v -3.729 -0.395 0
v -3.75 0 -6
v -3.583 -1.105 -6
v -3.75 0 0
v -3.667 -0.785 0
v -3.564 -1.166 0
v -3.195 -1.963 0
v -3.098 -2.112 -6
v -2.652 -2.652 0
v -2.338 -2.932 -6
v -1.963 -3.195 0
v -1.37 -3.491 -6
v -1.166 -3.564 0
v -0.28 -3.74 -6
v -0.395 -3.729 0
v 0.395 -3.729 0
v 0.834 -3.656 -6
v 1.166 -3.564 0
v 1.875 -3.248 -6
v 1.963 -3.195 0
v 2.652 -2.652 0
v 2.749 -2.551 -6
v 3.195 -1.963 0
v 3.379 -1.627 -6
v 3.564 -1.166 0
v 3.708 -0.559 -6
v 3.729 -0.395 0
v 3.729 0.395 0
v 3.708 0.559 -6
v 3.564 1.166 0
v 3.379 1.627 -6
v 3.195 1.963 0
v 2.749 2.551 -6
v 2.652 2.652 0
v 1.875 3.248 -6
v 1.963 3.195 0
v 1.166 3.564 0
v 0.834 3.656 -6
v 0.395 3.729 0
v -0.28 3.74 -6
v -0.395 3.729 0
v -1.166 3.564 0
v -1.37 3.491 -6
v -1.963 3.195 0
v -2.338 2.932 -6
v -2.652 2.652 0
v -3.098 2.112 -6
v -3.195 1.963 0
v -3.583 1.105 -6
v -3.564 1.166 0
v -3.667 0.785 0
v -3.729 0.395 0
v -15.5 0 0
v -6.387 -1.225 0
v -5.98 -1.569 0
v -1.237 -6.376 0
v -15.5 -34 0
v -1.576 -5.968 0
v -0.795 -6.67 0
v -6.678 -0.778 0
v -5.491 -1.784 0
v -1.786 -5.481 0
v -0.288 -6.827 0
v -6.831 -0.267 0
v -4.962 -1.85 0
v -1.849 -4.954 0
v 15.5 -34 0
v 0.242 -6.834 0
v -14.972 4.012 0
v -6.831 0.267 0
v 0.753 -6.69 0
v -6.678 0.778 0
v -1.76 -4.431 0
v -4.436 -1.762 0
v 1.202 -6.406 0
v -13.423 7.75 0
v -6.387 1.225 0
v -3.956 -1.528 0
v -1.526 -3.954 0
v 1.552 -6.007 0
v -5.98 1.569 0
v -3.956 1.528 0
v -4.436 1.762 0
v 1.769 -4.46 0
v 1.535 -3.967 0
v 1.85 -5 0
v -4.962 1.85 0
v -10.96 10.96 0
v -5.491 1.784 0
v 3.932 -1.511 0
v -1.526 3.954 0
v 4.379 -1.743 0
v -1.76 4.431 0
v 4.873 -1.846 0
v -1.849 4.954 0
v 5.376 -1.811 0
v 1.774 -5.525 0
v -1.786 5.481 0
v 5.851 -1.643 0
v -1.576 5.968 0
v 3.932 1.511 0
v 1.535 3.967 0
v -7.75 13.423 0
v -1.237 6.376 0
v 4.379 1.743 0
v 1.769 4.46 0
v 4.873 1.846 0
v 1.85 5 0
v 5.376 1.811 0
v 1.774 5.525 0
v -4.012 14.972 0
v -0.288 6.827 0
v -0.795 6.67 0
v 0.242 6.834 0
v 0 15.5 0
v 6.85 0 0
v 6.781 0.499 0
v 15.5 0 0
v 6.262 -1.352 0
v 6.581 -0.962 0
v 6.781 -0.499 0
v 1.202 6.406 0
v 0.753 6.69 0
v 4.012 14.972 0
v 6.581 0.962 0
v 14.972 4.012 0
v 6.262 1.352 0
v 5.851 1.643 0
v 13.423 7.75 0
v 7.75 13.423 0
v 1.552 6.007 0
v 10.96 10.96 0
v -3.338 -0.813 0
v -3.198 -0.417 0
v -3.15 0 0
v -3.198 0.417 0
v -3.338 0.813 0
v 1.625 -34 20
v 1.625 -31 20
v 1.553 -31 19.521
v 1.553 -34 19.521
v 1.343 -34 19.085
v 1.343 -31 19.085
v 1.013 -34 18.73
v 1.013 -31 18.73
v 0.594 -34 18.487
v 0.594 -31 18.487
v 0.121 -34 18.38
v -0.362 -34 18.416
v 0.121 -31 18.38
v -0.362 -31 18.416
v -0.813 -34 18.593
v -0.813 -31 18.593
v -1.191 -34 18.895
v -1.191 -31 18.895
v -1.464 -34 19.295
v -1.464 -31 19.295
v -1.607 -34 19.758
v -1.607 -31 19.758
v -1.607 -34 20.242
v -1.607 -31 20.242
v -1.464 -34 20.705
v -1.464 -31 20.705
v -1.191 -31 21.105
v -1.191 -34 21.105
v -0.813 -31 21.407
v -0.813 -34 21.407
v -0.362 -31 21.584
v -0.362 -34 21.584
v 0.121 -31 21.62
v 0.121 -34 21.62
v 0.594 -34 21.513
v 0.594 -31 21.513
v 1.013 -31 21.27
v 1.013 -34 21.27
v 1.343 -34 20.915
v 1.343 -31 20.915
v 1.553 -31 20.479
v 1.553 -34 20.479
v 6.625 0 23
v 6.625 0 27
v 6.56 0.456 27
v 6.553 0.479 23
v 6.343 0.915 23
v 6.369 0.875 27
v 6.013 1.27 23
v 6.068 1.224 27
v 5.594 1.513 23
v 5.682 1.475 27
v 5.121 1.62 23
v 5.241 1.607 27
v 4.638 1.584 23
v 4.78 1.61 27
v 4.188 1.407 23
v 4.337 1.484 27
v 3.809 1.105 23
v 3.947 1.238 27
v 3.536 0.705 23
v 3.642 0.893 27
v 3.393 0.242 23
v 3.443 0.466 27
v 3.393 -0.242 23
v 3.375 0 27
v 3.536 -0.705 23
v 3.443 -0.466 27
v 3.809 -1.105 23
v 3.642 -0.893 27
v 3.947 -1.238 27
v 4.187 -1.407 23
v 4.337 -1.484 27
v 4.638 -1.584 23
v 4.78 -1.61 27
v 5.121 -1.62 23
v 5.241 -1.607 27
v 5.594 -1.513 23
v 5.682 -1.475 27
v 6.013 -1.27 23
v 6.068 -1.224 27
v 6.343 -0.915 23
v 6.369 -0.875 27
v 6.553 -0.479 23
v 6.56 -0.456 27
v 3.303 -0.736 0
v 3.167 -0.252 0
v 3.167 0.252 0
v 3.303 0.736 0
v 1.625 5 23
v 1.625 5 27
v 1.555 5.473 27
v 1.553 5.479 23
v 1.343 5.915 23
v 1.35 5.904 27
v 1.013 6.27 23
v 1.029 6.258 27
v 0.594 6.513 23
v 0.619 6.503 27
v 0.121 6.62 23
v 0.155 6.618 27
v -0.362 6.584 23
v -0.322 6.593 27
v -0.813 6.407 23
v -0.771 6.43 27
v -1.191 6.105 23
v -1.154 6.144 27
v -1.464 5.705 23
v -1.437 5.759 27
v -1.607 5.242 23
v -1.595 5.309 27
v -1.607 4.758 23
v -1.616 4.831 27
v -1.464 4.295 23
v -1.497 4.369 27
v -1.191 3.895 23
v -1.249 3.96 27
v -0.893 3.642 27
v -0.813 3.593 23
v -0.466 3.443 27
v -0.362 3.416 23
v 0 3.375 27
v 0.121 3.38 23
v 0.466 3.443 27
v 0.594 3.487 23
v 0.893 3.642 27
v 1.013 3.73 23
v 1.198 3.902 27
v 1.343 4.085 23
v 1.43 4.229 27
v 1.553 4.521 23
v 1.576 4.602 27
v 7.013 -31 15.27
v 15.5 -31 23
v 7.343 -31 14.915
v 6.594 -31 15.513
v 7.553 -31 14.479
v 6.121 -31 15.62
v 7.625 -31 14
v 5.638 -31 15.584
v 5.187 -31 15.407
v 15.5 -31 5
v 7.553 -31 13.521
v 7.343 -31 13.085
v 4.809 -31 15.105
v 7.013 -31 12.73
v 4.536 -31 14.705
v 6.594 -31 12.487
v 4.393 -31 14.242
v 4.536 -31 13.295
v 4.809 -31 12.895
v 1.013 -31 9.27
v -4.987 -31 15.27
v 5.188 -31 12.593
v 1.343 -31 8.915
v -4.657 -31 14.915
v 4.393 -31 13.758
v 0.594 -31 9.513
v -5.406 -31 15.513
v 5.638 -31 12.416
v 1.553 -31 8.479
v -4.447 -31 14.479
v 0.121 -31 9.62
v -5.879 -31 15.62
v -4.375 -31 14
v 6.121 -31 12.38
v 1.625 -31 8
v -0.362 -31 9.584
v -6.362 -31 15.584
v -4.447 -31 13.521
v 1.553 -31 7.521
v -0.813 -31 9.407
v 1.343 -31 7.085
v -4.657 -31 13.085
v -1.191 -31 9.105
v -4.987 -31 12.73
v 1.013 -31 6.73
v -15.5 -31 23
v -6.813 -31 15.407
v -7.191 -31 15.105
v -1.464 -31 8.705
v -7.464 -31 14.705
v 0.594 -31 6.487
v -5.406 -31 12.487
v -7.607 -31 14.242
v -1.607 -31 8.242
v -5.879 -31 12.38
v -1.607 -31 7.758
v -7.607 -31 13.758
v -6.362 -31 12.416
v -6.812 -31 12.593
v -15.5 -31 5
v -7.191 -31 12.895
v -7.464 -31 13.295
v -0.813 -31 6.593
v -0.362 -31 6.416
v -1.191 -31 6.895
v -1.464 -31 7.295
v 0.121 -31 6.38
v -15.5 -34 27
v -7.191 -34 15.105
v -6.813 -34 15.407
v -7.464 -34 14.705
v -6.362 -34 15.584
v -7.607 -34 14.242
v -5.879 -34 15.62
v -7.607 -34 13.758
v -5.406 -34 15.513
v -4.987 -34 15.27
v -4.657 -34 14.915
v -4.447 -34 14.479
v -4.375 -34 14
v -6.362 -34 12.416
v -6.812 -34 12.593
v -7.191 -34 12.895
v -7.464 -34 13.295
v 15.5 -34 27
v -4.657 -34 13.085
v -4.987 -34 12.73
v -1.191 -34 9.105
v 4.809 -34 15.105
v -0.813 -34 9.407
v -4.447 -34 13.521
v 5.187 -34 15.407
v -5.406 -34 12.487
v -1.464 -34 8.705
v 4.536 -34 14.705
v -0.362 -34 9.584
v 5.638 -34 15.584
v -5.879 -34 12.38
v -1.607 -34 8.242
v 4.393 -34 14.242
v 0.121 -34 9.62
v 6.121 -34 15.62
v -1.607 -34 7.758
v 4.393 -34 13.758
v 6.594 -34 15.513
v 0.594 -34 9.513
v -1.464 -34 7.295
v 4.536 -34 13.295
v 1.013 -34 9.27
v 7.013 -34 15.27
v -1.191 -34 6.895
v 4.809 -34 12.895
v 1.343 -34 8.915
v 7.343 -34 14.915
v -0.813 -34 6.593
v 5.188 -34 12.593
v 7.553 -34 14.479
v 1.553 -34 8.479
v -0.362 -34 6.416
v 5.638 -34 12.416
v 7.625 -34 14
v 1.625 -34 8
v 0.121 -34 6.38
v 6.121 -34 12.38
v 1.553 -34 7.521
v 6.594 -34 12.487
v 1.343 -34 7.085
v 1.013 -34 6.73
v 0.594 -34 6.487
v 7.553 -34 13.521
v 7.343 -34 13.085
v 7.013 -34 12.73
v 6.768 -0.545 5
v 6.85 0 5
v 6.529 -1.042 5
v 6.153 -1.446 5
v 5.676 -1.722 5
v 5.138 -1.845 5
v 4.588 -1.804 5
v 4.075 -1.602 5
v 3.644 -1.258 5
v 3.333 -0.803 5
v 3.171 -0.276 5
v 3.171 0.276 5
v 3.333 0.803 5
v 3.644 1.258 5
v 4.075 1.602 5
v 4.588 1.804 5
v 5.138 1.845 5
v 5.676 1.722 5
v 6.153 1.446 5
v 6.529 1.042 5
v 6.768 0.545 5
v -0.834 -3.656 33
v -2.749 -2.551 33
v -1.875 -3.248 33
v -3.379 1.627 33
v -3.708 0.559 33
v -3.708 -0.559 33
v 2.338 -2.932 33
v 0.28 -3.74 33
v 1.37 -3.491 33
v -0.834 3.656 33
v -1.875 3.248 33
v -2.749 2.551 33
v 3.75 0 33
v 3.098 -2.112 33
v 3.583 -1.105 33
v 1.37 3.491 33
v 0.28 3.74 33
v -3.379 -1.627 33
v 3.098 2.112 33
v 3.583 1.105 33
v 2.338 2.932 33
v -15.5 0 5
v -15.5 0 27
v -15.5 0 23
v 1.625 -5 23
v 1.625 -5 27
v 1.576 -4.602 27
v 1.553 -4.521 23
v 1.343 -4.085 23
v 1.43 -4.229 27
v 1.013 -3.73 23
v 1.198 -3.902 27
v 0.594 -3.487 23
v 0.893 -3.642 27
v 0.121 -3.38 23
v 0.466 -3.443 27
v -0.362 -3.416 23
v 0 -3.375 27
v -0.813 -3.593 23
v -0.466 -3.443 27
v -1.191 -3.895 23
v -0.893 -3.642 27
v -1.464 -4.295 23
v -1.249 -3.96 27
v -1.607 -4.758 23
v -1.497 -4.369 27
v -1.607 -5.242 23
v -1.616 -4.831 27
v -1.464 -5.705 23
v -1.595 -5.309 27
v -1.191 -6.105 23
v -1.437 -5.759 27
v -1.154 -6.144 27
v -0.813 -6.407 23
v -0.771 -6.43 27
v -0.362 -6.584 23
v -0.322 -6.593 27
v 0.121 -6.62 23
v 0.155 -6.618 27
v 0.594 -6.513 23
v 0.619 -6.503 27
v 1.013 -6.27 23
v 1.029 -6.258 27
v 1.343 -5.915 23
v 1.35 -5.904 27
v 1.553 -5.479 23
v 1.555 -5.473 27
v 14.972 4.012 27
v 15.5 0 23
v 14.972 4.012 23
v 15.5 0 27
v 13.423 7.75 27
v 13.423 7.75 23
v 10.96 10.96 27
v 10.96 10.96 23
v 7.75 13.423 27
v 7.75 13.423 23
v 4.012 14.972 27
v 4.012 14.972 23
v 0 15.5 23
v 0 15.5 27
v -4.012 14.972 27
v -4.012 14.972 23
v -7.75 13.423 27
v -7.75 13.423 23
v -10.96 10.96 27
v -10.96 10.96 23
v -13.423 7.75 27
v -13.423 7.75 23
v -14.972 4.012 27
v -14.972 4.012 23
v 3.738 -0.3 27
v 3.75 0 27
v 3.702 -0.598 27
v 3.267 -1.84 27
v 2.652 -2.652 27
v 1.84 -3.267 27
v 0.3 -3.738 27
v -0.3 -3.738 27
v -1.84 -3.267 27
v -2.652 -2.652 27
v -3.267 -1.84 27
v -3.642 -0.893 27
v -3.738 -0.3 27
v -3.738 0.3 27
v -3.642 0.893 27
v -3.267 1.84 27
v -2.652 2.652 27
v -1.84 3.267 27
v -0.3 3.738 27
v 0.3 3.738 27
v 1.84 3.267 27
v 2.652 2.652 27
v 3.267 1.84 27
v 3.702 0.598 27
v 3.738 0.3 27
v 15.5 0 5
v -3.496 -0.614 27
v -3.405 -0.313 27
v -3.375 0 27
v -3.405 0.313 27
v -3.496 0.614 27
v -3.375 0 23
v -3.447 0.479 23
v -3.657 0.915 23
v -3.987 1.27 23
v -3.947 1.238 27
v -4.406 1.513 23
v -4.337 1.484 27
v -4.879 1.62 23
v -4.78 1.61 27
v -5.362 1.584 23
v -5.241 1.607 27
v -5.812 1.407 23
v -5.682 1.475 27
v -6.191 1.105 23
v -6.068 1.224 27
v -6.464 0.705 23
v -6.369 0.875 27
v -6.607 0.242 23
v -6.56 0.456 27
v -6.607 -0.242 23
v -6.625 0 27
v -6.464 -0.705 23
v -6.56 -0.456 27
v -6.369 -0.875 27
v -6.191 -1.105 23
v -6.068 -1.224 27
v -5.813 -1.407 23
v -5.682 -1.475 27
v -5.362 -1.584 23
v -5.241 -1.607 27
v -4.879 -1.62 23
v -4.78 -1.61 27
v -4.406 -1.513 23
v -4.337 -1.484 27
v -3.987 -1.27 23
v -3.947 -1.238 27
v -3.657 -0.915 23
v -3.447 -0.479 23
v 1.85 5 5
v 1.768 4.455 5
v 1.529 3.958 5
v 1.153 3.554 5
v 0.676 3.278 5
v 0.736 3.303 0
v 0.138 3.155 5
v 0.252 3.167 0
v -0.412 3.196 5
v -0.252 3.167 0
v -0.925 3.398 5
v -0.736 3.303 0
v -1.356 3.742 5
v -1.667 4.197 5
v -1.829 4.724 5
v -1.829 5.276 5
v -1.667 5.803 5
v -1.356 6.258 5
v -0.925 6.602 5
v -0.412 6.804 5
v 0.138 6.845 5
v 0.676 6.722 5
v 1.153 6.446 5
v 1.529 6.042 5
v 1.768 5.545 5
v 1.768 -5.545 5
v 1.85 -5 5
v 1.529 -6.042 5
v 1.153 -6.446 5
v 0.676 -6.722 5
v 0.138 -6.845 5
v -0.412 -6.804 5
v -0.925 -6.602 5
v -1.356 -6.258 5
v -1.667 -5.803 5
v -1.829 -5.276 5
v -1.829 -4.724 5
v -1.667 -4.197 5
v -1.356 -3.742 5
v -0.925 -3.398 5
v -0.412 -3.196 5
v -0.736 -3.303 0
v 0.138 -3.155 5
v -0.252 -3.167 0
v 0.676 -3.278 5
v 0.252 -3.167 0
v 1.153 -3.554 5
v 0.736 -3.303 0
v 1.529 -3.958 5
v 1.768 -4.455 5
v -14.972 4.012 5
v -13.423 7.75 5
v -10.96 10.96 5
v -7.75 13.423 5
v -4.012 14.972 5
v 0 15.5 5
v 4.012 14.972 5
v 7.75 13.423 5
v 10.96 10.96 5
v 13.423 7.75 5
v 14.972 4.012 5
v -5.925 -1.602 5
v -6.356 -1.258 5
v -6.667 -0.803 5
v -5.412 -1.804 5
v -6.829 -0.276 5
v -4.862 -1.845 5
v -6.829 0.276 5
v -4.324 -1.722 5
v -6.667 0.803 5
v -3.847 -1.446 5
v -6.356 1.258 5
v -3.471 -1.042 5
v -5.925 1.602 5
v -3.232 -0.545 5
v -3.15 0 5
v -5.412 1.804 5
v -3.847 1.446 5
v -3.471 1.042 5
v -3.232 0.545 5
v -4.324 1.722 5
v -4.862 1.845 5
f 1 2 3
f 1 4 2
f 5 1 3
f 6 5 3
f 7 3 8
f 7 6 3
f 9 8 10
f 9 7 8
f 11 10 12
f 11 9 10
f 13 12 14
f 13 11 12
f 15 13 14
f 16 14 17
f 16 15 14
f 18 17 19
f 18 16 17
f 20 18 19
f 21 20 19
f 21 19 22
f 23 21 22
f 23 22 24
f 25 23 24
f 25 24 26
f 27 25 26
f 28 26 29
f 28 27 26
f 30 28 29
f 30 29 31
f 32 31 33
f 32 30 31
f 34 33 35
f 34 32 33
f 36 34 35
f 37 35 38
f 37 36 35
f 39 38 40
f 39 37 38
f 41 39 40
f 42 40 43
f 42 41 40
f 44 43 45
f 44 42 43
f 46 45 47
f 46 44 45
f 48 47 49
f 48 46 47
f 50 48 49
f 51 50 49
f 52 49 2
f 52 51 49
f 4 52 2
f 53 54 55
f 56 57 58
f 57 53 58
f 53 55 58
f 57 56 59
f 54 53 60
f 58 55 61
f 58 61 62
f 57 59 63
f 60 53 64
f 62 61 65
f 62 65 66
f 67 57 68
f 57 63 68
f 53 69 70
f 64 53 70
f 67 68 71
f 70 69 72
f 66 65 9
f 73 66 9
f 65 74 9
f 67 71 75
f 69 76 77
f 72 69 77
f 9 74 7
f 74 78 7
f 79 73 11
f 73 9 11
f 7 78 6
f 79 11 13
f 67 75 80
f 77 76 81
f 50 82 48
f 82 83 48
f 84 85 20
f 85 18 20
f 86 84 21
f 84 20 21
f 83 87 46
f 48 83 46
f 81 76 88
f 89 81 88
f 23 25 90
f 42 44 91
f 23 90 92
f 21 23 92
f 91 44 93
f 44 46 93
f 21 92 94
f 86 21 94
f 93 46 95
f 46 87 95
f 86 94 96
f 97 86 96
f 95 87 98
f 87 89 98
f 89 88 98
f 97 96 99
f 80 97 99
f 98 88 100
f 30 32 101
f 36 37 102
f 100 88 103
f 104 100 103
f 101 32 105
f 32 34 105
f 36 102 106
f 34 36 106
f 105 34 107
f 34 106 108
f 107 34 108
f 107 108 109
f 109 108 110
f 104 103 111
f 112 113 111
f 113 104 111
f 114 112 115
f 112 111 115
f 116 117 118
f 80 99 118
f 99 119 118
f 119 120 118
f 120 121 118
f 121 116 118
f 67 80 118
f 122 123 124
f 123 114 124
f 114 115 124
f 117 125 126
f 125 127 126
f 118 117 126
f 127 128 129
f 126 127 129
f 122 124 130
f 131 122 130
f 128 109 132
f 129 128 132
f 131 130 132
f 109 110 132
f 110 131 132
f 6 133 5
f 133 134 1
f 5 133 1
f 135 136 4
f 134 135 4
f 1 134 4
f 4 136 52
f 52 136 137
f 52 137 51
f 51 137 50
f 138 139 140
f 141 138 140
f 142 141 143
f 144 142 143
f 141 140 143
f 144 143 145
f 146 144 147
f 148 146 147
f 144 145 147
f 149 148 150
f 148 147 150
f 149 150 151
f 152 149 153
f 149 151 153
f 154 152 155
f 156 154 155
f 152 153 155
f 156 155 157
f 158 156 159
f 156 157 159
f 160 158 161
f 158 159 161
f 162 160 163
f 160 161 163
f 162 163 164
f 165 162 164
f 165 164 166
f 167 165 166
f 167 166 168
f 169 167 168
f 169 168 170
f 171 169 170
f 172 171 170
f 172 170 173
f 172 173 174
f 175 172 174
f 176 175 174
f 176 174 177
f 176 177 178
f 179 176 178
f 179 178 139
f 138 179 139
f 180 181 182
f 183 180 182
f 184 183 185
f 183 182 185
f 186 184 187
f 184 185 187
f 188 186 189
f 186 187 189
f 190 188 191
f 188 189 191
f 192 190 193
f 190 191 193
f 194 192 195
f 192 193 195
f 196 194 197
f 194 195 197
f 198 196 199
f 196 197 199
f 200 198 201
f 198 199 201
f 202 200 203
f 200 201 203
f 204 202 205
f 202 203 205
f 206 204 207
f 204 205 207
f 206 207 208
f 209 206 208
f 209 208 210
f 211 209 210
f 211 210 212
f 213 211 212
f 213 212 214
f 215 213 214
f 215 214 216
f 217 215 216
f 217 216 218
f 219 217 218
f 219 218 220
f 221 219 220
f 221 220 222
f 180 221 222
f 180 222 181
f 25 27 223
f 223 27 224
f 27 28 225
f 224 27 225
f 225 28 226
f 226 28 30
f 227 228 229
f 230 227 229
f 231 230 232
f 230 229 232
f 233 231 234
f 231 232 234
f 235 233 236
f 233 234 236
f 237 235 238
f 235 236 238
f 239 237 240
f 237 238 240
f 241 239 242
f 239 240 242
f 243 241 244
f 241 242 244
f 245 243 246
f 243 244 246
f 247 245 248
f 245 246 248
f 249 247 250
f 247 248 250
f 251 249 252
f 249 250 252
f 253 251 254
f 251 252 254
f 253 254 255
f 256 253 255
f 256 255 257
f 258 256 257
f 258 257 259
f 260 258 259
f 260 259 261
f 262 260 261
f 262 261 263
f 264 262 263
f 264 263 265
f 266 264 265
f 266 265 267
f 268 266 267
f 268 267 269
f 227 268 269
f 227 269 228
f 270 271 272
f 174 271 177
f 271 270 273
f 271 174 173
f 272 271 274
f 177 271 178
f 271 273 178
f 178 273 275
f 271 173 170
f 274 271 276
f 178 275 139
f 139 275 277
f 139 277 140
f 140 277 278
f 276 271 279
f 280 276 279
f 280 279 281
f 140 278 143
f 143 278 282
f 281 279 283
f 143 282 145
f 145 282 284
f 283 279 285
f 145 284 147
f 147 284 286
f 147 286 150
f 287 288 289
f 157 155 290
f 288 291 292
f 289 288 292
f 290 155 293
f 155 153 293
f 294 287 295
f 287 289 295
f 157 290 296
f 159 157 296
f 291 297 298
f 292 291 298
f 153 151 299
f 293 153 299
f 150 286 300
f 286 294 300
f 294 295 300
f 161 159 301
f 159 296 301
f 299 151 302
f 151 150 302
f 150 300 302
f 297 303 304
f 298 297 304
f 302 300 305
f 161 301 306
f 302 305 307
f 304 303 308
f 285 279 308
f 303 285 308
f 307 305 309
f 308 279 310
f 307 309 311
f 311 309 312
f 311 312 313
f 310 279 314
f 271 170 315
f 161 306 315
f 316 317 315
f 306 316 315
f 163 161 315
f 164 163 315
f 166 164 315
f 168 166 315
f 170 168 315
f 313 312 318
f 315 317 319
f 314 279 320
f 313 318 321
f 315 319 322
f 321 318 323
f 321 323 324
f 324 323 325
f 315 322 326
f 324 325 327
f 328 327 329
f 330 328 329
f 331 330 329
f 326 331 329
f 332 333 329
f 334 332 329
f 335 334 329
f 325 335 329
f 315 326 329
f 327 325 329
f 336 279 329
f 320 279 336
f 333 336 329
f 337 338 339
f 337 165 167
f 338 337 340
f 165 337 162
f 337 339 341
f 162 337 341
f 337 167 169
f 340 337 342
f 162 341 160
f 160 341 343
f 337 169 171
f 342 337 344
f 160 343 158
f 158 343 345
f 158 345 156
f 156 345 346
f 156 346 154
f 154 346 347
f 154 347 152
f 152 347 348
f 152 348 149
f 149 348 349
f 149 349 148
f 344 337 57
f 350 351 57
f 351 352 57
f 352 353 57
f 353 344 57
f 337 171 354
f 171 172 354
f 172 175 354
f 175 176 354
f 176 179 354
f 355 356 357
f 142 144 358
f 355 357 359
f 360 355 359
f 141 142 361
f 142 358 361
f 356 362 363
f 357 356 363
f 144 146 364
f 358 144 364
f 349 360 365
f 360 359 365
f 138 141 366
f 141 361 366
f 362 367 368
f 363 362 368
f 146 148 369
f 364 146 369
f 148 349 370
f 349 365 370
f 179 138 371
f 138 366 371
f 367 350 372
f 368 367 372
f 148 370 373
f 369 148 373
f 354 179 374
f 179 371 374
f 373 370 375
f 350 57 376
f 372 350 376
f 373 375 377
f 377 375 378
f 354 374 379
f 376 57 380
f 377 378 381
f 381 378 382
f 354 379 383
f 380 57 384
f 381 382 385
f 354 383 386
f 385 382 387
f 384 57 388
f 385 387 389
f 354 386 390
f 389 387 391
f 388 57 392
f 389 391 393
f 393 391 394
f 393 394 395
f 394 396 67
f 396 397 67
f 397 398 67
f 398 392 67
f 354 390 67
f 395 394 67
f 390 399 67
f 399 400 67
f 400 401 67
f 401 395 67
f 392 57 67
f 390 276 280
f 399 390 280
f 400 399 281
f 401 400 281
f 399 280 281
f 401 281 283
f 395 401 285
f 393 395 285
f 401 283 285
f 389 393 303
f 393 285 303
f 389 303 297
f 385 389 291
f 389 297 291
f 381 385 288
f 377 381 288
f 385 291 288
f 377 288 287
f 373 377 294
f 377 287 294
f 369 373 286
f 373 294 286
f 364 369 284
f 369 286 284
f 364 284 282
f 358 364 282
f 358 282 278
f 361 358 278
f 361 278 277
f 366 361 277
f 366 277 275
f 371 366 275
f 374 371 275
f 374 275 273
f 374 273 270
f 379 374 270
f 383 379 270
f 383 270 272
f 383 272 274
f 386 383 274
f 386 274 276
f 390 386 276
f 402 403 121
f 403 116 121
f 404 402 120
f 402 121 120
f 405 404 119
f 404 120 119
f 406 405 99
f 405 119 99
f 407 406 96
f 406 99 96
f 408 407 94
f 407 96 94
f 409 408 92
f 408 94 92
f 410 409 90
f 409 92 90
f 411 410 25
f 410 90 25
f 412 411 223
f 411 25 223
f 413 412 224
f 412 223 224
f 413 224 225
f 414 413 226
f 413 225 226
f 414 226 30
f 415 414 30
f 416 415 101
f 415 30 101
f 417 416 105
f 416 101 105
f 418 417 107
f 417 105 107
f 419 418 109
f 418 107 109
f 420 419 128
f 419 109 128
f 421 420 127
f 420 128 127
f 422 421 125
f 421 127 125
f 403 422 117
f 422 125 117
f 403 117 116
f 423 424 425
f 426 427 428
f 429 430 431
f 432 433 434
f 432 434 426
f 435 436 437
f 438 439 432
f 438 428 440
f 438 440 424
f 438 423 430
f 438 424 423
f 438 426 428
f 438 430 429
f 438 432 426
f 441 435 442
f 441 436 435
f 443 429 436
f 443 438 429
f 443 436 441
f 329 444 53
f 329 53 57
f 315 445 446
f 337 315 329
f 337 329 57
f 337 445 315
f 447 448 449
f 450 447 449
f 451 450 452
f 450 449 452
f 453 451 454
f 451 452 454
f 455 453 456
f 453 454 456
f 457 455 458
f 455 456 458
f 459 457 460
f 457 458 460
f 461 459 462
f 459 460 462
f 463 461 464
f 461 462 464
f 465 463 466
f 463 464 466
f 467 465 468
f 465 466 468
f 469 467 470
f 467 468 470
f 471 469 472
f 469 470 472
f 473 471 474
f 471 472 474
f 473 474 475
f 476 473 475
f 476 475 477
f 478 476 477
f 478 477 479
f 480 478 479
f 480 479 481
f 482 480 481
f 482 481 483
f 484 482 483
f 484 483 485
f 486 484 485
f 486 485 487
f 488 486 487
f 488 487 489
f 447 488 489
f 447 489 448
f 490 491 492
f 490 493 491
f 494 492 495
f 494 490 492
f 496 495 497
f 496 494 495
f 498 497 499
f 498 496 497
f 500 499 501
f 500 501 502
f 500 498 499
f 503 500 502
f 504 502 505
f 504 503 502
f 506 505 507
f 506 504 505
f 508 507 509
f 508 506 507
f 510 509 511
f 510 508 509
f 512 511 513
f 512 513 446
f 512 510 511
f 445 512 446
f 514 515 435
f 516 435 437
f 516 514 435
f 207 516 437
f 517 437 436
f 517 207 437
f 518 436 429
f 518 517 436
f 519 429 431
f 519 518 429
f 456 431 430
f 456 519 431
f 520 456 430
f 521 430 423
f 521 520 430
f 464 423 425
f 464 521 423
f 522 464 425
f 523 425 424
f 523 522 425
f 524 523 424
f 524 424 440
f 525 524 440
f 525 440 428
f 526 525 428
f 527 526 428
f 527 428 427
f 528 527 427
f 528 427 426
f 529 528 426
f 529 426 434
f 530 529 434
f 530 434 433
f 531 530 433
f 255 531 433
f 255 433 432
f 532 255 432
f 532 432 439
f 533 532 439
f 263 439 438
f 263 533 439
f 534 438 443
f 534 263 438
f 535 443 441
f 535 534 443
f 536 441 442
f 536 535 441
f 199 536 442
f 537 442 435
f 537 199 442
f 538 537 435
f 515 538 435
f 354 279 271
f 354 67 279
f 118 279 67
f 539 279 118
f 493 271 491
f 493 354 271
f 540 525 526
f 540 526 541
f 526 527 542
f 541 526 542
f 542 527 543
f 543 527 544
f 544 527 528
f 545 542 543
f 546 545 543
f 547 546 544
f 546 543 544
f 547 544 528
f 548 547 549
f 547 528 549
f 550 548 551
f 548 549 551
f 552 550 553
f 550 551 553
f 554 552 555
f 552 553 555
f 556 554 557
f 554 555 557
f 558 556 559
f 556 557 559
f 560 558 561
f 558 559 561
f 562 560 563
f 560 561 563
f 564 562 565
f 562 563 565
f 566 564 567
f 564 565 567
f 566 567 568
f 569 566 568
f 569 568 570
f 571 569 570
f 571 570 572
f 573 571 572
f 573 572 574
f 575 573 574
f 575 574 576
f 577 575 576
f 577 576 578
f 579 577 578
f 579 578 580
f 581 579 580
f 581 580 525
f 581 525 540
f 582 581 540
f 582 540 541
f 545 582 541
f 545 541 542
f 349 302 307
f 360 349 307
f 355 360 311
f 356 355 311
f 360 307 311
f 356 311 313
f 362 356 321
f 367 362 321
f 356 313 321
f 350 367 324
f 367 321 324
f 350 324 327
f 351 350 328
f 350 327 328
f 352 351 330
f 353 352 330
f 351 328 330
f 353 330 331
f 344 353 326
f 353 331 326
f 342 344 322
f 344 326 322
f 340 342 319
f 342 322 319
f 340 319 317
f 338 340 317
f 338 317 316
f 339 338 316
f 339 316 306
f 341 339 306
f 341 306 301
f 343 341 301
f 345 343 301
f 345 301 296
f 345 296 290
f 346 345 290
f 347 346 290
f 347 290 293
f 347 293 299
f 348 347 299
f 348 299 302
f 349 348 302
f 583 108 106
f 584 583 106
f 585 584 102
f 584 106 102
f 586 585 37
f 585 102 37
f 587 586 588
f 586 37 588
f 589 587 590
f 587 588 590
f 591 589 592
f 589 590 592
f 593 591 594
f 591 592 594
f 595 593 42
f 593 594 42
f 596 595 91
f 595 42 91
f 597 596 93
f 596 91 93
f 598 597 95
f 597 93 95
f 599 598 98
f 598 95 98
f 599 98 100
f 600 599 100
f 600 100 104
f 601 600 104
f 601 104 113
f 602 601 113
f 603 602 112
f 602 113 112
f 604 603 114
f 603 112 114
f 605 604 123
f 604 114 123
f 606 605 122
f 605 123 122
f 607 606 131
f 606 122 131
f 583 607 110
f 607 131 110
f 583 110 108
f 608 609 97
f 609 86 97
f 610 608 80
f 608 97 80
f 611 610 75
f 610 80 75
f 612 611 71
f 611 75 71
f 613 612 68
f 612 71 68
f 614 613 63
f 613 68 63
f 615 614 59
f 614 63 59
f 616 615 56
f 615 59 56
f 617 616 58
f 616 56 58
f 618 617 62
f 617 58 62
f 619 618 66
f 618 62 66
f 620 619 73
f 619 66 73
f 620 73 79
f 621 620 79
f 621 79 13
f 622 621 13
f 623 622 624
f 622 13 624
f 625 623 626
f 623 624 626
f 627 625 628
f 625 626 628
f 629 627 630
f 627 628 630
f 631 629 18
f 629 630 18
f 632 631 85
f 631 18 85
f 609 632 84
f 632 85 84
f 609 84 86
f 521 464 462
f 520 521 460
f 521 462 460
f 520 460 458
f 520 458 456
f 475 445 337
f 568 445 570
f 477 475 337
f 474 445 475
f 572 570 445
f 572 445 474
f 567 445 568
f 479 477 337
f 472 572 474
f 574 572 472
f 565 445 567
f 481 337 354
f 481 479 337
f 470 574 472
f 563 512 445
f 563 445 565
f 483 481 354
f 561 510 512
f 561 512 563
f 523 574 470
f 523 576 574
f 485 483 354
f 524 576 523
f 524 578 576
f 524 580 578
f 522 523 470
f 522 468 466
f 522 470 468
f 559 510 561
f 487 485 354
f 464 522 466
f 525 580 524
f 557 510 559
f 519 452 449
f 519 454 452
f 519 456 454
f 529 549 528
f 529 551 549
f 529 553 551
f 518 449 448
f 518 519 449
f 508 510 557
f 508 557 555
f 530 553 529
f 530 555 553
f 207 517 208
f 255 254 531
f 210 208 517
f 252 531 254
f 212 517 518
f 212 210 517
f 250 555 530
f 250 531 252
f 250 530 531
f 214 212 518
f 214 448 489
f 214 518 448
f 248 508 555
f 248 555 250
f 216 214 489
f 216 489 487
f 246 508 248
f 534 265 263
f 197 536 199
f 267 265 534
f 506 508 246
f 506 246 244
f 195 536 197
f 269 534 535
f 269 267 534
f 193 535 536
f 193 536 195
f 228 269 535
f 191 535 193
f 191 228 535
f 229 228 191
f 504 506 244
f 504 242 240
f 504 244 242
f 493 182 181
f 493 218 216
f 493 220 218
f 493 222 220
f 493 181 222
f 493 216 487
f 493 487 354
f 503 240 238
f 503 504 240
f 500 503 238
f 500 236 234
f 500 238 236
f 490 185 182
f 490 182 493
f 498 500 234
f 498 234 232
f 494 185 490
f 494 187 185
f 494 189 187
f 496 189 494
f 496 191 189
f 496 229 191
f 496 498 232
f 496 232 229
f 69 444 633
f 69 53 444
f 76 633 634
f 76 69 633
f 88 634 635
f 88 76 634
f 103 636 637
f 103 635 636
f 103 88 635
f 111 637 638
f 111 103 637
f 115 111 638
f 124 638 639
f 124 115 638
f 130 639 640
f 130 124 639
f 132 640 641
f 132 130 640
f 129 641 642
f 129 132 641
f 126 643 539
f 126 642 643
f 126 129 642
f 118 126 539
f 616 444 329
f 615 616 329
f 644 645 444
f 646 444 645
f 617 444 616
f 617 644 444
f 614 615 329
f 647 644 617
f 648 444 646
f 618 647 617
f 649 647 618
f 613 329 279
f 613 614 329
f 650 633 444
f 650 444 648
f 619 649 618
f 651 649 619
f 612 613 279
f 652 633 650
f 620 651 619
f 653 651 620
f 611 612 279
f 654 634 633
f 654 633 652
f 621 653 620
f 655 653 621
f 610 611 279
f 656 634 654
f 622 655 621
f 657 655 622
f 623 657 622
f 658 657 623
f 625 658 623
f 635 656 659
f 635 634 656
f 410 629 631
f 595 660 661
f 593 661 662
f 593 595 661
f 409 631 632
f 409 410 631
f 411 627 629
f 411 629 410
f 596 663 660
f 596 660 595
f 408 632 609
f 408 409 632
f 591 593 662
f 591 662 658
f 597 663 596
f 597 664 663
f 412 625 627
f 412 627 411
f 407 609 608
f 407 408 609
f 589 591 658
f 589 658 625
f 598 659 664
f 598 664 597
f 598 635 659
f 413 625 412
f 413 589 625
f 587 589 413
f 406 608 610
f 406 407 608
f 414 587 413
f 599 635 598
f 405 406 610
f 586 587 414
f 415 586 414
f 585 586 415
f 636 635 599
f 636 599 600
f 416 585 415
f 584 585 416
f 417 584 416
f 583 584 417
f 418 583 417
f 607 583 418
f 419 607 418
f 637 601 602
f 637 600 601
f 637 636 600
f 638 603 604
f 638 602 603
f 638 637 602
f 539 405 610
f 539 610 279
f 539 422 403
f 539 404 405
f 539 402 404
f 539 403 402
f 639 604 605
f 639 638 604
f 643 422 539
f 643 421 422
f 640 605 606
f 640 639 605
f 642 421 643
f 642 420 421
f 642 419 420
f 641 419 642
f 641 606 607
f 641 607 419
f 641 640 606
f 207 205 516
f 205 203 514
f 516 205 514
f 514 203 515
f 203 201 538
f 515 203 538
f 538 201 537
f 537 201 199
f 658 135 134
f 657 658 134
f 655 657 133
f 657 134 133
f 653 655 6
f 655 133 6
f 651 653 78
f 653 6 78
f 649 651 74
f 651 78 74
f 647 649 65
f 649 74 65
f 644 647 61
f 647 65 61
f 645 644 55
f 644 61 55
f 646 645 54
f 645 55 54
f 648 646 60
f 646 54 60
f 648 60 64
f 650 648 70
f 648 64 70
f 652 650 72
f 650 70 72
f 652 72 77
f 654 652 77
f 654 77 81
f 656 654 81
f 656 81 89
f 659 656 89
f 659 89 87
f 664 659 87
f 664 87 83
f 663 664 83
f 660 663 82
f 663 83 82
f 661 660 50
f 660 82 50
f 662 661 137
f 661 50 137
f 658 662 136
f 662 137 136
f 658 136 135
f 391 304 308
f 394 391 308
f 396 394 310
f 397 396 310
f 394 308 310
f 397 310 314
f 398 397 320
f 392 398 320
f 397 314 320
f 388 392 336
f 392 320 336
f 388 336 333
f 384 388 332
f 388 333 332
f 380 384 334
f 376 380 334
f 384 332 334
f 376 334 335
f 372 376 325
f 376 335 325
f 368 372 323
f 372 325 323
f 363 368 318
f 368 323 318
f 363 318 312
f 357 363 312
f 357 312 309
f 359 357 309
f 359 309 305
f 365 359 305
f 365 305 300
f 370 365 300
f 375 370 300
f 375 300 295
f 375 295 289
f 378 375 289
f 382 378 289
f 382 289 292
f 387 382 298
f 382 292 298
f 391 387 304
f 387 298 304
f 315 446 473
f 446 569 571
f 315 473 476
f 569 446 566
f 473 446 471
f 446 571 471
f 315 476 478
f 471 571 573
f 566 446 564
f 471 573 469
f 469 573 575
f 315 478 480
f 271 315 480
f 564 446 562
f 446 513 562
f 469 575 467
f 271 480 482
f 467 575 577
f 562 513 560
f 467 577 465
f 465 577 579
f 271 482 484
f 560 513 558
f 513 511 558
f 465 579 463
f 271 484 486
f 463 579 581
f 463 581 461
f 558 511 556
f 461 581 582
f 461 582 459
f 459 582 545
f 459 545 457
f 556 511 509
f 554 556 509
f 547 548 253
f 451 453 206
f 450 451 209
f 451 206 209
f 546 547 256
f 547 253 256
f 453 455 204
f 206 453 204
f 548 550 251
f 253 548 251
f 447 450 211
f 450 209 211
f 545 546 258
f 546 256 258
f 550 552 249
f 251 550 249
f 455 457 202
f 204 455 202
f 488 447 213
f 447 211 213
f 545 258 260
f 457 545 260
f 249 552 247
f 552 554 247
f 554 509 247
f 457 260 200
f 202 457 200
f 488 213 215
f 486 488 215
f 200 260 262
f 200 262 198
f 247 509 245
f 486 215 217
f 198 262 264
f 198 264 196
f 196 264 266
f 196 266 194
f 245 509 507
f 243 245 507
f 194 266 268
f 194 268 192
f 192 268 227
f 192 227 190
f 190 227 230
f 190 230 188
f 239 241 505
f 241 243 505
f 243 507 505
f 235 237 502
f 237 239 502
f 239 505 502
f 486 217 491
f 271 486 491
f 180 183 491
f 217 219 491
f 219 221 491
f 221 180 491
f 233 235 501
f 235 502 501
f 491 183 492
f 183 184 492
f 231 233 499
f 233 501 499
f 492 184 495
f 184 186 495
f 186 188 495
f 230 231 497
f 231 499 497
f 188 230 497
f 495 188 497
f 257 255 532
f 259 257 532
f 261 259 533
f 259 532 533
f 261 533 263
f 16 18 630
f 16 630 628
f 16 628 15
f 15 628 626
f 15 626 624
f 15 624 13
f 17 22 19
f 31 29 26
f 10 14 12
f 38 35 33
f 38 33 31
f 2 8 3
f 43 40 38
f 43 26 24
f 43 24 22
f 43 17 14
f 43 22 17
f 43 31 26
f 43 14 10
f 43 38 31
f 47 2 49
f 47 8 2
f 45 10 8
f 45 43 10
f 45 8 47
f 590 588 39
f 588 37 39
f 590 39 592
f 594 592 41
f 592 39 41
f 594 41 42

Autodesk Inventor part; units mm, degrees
ref_plane "YZ Plane" through (0, 0, 0) normal (1, 0, 0) x (0, 1, 0)
ref_plane "XZ Plane" through (0, 0, 0) normal (0, 1, 0) x (-1, 0, 0)
ref_plane "XY Plane" through (0, 0, 0) normal (0, 0, 1) x (1, 0, 0)
sketch "Sketch1" plane through (0, 0, 0) normal (0, 0, 1) x (1, 0, 0)
  arc A0 (15.5, 0) -> (-15.5, 0) centre (0, 0) ccw
  line L0 (-15.5, 0) -> (-15.5, -34)
  line L1 (-15.5, -34) -> (15.5, -34)
  line L2 (15.5, -34) -> (15.5, 0)
  circle A1 centre (0, 5) radius 1.85
  circle A2 centre (-5, 0) radius 1.85
  circle A3 centre (0, -5) radius 1.85
  circle A4 centre (5, 0) radius 1.85
  dimension "d0" = 31
  dimension "d1" = 34
  dimension "d3" = 3.7
  dimension "d6" = 360
extrude "Extrusion1" add sketch "Sketch1" along normal blind 5
sketch "Sketch2" plane through (0, 0, 5) normal (0, 0, 1) x (1, 0, 0)
  line L0 (-15.5, -34) -> (15.5, -34) projected
  line L1 (15.5, -34) -> (15.5, 0) projected
  line L2 (-15.5, -34) -> (15.5, -34)
  line L3 (15.5, -34) -> (15.5, -31)
  line L4 (15.5, -31) -> (-15.5, -31)
  line L5 (-15.5, -31) -> (-15.5, -34)
  point P0 (0, 0)
  dimension "d10" = 3
extrude "Extrusion2" add sketch "Sketch2" along normal blind 22
sketch "Sketch3" plane through (0, 0, 27) normal (0, 0, 1) x (1, 0, 0)
  line L0 (15.5, -31) -> (-15.5, -31) projected
  line L1 (15.5, -34) -> (15.5, 0) projected
  line L2 (15.5, -31) -> (15.5, 0)
  line L3 (-15.5, 0) -> (-15.5, -31) projected
  line L4 (-15.5, 0) -> (-15.5, -31)
  line L5 (-15.5, -31) -> (15.5, -31)
  arc A0 (15.5, 0) -> (-15.5, 0) centre (0, 0) ccw
  point P0 (0, 0)
extrude "Extrusion3" add sketch "Sketch3" against normal blind 4
sketch "Sketch4" plane through (0, 0, 0) normal (0, 0, -1) x (-1, 0, 0)
  circle A0 centre (0, 0) radius 3.75
  dimension "d15" = 7.5
extrude "Extrusion4" add sketch "Sketch4" along normal blind 6
sketch "Sketch5" plane through (0, 0, 27) normal (0, 0, 1) x (1, 0, 0)
  circle A0 centre (0, 0) radius 3.75
  dimension "d20" = 7.5
extrude "Extrusion5" add sketch "Sketch5" along normal blind 6
sketch "Sketch6" plane through (-15.5, -31, 5) normal (0, 1, 0) x (1, 0, 0)
  line L0 (0, -18) -> (31, -18) projected
  line L1 (17.35, 0) -> (13.65, 0) projected
  circle A0 centre (9.5, -9) radius 1.625
  circle A1 centre (15.5, -15) radius 1.625
  circle A2 centre (21.5, -9) radius 1.625
  circle A3 centre (15.5, -3) radius 1.625
  point P0 (15.5, 5)
  point P1 (15.5, -9)
  dimension "d22" = 3.25
  dimension "d25" = 360
extrude "Extrusion6" cut sketch "Sketch6" against normal through all
sketch "Sketch7" plane through (0, 0, 27) normal (0, 0, 1) x (1, 0, 0)
  circle A0 centre (0, 5) radius 1.625
  circle A1 centre (5, 0) radius 1.625
  circle A2 centre (0, -5) radius 1.625
  circle A3 centre (-5, 0) radius 1.625
  point P0 (0, 0)
  dimension "d31" = 3.25
  dimension "d32" = 3.25
  dimension "d33" = 3.25
  dimension "d34" = 3.25
extrude "Extrusion7" cut sketch "Sketch7" against normal up to surface (4 mm away)
properties part number "Base_Mount"
